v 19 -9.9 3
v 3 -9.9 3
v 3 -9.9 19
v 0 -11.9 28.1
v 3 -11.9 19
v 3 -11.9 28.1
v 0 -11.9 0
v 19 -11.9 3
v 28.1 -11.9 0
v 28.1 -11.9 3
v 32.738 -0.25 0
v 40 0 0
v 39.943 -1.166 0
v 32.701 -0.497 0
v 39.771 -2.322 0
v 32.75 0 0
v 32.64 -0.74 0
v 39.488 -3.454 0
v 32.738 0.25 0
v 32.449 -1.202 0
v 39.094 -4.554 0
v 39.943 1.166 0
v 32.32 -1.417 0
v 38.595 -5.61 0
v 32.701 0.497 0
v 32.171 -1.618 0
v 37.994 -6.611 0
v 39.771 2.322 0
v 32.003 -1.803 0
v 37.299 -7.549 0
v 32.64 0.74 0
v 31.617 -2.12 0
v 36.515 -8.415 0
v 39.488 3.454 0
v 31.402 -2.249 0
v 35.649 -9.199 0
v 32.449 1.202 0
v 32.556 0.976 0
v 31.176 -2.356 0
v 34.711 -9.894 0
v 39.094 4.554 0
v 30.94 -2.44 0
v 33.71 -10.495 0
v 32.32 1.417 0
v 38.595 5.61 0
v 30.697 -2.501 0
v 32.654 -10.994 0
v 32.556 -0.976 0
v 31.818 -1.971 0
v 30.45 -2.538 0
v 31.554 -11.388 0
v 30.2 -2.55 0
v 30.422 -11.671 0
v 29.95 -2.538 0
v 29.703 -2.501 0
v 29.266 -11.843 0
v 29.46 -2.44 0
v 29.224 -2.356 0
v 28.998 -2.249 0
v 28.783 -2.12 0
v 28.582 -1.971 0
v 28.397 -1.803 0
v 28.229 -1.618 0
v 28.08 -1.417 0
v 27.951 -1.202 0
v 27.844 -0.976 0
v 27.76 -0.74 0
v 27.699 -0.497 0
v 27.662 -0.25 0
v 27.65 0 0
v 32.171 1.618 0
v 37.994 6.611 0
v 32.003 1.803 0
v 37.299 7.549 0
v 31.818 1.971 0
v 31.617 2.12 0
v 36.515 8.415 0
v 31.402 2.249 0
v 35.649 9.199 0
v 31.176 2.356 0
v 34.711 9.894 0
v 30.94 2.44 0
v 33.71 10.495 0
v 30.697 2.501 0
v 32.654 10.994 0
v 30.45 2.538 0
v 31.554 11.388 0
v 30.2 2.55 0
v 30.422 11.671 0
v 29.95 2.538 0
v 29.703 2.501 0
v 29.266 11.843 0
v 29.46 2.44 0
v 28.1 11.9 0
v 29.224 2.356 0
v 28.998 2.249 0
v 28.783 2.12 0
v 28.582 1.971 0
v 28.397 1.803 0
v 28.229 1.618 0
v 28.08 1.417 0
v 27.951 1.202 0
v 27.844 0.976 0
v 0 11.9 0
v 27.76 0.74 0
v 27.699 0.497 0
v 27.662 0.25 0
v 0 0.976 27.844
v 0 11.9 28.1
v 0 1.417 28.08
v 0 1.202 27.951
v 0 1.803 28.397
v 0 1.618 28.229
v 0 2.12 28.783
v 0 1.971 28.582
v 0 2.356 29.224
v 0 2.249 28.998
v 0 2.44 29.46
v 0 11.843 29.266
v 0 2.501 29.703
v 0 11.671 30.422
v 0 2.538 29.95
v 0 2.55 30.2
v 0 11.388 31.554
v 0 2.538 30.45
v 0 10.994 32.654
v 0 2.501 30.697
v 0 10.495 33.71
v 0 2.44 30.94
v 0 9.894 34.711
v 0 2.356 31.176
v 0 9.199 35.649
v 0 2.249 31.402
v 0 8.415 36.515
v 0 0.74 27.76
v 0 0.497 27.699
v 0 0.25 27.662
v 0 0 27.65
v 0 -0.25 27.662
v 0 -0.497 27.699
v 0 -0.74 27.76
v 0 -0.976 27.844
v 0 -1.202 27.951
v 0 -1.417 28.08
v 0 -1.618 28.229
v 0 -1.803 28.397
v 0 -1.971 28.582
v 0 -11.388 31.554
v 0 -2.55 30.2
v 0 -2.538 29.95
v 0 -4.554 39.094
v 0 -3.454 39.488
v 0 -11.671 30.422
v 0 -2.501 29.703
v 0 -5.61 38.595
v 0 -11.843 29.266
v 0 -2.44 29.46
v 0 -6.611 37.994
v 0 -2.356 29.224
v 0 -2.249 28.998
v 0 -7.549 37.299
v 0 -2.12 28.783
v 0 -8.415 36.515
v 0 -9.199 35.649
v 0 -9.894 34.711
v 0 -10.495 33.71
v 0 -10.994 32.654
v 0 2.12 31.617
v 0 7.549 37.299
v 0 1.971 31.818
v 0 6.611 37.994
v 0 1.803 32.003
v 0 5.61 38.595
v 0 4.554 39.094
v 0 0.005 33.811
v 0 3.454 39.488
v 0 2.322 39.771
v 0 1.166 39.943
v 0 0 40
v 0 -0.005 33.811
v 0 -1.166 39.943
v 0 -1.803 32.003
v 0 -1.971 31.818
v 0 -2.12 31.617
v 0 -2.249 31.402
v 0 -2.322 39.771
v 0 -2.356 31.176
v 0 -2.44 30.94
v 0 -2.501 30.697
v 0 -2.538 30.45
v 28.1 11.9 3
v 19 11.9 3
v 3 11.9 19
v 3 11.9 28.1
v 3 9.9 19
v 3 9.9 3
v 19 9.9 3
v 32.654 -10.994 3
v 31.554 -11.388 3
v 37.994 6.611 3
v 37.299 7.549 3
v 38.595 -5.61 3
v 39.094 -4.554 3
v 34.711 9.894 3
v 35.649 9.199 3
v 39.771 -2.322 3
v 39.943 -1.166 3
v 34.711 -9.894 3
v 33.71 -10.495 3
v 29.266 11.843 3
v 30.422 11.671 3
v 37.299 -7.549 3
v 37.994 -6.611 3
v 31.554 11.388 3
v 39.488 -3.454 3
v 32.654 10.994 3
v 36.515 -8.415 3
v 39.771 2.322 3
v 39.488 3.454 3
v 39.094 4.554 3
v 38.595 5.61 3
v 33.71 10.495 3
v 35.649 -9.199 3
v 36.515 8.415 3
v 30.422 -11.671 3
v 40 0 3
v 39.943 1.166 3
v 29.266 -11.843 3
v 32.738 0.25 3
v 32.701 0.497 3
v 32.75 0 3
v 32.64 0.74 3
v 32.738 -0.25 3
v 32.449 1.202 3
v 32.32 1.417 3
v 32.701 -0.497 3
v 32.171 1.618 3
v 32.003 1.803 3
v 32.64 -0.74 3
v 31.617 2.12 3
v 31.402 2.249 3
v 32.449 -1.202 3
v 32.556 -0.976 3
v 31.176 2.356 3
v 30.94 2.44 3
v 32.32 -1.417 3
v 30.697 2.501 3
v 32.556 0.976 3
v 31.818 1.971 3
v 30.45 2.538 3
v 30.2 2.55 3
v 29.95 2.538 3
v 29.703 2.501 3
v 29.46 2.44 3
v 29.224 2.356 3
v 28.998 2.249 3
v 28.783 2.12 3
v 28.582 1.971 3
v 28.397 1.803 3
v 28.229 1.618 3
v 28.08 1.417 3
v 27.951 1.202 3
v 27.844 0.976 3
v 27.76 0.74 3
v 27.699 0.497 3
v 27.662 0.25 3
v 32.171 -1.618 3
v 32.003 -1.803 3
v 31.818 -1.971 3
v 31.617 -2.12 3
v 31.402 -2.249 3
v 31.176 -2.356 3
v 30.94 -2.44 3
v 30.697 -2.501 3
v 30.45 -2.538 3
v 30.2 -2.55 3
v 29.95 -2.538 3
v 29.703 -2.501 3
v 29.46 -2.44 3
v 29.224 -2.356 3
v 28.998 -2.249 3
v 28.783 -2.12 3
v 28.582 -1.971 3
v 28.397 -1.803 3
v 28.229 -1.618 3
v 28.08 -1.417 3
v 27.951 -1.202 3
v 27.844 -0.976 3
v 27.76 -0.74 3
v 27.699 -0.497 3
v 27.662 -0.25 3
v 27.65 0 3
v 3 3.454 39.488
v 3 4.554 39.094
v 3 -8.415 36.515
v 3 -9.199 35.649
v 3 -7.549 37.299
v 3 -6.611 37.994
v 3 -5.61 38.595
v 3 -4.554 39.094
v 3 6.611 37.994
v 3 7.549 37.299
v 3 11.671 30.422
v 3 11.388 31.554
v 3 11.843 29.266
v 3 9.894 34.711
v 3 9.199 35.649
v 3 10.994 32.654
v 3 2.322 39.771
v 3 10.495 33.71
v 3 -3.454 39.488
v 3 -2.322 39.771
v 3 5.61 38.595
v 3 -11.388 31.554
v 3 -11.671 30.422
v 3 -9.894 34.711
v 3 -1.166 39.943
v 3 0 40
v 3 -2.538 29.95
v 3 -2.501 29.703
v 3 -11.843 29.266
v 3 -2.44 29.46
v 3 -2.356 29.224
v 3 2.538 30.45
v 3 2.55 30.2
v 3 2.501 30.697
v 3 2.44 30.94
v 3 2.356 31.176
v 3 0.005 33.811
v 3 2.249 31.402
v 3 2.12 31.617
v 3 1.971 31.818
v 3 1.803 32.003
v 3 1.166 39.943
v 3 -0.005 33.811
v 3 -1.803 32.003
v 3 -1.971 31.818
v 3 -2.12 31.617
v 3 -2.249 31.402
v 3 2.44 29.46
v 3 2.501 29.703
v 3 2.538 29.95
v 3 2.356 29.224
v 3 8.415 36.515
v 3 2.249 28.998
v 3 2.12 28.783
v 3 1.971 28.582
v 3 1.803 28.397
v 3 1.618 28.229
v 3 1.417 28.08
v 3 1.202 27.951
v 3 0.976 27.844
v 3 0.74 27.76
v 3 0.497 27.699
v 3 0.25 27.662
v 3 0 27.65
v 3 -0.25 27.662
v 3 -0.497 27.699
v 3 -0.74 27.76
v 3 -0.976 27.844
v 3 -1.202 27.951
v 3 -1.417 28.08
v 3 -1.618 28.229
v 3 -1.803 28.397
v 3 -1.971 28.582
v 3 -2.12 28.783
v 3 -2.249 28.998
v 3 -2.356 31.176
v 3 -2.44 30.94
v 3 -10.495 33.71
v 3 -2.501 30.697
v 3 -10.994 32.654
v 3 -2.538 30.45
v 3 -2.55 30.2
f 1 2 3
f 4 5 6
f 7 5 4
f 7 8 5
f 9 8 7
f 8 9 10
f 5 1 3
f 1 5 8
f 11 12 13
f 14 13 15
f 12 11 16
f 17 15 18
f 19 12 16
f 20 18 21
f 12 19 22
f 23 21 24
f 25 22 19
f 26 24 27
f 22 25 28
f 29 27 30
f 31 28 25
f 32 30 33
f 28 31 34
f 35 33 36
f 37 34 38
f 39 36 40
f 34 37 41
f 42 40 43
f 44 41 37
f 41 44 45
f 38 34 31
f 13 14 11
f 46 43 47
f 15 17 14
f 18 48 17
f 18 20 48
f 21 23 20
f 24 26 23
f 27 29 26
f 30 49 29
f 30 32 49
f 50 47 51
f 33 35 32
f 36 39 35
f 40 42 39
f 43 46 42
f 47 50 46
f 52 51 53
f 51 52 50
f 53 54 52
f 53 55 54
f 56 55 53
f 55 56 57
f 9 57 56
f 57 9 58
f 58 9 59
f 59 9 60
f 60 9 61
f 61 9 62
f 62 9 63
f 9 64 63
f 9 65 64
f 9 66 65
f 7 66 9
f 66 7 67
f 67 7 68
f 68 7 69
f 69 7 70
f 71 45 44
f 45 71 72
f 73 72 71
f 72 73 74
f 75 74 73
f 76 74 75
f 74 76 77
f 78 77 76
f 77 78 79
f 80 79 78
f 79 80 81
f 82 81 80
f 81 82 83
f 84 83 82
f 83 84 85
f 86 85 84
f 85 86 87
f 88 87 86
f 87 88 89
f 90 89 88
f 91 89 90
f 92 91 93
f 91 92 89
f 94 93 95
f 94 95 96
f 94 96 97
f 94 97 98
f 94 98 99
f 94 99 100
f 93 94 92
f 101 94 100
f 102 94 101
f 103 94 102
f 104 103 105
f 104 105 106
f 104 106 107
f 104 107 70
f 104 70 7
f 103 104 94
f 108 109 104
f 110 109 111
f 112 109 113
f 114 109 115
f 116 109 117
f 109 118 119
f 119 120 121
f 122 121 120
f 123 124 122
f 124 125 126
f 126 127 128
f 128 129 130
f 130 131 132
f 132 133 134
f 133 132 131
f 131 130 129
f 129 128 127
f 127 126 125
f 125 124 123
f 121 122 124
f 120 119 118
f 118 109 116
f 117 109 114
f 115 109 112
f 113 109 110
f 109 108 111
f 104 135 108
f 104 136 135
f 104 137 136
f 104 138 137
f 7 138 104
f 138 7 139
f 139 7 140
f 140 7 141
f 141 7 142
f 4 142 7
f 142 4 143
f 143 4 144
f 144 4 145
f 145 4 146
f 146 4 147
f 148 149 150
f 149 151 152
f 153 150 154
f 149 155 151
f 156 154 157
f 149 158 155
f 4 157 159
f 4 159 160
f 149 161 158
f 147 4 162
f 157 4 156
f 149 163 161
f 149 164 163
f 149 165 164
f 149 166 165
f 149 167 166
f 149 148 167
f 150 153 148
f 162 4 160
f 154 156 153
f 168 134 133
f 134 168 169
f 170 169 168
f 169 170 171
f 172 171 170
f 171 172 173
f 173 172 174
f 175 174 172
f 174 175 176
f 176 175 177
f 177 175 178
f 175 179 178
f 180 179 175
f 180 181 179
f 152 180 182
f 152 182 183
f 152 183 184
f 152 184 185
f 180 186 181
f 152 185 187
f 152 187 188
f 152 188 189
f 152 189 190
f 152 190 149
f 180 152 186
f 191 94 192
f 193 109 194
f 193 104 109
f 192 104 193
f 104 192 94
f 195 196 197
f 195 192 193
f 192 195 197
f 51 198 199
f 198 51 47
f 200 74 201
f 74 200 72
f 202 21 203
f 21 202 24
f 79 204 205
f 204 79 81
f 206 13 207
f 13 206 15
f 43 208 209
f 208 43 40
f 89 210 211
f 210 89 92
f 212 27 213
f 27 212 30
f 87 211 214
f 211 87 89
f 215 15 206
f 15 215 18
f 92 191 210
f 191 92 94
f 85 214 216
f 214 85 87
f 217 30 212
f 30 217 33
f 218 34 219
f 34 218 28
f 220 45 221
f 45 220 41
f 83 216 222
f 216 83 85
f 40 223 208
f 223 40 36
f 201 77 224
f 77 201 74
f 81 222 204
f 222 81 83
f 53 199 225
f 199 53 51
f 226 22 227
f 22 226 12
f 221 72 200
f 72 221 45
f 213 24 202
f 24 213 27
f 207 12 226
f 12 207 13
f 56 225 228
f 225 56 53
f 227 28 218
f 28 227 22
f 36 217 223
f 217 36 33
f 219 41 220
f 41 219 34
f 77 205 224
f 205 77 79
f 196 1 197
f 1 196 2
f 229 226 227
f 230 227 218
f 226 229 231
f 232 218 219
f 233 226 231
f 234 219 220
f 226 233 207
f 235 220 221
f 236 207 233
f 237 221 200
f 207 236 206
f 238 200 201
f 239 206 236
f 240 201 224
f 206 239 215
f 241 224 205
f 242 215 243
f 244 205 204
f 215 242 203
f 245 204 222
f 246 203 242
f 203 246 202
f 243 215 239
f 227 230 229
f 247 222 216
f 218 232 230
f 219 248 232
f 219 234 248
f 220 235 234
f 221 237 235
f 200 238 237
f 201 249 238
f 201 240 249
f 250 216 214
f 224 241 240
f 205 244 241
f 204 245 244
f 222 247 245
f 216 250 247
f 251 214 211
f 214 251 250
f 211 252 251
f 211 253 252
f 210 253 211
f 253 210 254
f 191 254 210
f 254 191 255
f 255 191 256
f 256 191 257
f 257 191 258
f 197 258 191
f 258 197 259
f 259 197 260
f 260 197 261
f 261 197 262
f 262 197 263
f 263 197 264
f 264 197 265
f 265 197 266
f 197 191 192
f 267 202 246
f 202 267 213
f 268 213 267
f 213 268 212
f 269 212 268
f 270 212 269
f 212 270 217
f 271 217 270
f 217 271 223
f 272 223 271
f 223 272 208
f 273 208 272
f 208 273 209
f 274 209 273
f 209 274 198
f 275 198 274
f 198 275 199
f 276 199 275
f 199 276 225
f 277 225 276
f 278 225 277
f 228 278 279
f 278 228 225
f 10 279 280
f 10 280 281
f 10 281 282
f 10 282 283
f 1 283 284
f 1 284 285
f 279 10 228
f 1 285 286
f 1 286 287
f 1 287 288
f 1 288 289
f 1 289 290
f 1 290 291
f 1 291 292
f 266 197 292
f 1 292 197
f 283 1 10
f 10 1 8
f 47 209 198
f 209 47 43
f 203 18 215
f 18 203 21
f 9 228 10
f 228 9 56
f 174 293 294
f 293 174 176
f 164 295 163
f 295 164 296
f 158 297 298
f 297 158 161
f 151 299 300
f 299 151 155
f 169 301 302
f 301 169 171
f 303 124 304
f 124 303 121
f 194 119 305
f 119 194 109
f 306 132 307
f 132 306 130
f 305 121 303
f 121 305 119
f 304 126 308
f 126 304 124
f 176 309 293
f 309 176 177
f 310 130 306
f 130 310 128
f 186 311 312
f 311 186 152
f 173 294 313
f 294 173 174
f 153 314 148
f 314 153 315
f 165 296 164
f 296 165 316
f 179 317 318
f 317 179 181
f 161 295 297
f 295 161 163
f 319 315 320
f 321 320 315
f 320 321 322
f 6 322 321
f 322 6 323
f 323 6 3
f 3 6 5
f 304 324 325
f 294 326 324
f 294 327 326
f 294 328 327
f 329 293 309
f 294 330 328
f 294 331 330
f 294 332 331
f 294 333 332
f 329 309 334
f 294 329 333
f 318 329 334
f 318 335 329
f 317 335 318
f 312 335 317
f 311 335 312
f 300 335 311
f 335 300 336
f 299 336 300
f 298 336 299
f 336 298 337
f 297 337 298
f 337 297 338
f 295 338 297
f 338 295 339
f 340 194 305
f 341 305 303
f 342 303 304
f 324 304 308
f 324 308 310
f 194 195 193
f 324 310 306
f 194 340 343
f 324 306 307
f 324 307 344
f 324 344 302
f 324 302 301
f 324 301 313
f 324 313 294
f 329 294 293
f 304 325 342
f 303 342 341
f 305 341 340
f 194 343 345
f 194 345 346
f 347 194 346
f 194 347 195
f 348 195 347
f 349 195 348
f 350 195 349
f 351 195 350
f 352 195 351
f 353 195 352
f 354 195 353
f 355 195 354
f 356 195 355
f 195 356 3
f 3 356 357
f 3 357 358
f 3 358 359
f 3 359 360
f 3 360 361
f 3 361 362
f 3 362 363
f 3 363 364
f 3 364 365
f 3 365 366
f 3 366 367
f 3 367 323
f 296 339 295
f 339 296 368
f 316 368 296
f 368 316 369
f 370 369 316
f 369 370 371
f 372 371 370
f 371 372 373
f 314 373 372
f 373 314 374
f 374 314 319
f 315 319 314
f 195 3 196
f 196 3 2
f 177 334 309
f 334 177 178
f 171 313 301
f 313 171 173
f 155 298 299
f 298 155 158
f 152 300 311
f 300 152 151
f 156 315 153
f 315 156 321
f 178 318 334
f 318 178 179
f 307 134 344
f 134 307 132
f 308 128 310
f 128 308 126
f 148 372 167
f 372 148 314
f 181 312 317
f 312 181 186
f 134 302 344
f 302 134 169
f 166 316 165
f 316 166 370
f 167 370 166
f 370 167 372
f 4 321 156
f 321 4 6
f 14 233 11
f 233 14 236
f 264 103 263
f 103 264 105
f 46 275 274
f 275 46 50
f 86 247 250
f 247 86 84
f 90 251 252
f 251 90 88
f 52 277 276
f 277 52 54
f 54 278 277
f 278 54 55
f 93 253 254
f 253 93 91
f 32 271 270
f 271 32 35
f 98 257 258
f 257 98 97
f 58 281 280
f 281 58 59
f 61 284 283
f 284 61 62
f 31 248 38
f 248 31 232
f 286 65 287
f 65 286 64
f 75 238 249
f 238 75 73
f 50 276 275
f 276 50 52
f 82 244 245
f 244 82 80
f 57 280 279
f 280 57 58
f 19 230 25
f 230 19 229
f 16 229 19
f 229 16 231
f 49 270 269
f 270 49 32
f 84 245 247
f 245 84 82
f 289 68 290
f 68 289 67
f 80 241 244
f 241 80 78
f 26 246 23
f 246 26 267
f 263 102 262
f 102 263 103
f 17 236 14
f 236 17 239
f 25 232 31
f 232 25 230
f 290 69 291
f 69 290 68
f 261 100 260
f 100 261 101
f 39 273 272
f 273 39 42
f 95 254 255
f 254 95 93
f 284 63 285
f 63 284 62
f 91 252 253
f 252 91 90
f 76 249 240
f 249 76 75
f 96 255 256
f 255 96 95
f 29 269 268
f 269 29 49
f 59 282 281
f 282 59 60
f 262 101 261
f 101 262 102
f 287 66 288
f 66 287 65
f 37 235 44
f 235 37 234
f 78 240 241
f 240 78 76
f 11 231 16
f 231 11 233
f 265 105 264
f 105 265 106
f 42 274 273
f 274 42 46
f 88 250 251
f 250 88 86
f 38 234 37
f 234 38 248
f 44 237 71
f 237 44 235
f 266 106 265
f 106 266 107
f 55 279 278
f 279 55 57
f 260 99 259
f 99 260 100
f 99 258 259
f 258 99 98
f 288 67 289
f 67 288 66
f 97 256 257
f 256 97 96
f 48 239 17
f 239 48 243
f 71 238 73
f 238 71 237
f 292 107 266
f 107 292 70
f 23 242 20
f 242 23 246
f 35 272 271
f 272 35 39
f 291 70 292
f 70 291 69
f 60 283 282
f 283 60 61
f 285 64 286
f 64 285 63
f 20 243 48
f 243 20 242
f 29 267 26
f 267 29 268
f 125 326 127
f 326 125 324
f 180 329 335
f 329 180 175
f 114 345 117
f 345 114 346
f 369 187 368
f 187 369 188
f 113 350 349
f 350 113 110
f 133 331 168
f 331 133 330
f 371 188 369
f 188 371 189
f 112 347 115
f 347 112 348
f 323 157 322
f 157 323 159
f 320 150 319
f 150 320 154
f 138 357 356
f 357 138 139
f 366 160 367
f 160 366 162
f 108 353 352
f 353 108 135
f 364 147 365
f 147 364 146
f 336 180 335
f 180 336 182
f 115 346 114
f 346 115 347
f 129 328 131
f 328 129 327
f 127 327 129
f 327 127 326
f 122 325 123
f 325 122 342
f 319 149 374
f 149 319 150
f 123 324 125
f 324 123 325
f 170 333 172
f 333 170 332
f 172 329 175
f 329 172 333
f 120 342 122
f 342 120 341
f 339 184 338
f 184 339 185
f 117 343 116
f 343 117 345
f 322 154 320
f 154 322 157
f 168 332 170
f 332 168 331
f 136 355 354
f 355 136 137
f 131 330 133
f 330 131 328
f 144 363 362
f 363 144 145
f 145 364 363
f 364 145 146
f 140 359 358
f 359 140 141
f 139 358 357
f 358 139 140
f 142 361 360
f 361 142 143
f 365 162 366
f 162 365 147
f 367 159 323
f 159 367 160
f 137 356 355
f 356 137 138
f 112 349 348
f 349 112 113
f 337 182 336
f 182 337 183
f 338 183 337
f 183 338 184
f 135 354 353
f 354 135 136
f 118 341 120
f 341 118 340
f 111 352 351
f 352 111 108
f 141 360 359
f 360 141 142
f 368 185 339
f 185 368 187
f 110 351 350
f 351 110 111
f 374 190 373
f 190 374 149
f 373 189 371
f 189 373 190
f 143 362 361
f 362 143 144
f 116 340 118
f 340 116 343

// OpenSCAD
// Corner bracket, printed as an L on its flat leg. The upright hole is a
// teardrop (point up) and two side gussets stiffen the bend.
leg_length = 40;
bracket_width = 23.8;
hole_diameter = 5.1;
hole_offset = 30.2;
thickness = 3;
gusset = 2;
$fn = 64;

module leg_outline() {
    // rounded-end leg in its own plane: u along the leg, v across it
    hull() {
        translate([0, -bracket_width/2]) square([1, bracket_width]);
        translate([leg_length - bracket_width/2, 0]) circle(d = bracket_width);
    }
}

module teardrop(d, h) {
    // axis along X, point towards +Z
    rotate([0, 90, 0]) rotate([0, 0, 0]) linear_extrude(h, center = true)
        hull() {
            circle(d = d);
            translate([-d/2*sqrt(2), 0]) square(0.01, center = true);
        }
}

difference() {
    union() {
        linear_extrude(thickness) leg_outline();
        // upright leg: outline in the YZ plane, extruded along +X
        rotate([0, -90, 0]) translate([0, 0, -thickness]) linear_extrude(thickness) leg_outline();
        for (y = [-bracket_width/2, bracket_width/2 - gusset])
            translate([0, y + gusset, 0]) rotate([90, 0, 0]) linear_extrude(gusset)
                polygon([[0, 0], [22, 0], [0, 22]]);
    }
    translate([hole_offset, 0, -1]) cylinder(d = hole_diameter, h = thickness + 2);
    translate([thickness/2, 0, hole_offset]) teardrop(hole_diameter, thickness + 2);
}
